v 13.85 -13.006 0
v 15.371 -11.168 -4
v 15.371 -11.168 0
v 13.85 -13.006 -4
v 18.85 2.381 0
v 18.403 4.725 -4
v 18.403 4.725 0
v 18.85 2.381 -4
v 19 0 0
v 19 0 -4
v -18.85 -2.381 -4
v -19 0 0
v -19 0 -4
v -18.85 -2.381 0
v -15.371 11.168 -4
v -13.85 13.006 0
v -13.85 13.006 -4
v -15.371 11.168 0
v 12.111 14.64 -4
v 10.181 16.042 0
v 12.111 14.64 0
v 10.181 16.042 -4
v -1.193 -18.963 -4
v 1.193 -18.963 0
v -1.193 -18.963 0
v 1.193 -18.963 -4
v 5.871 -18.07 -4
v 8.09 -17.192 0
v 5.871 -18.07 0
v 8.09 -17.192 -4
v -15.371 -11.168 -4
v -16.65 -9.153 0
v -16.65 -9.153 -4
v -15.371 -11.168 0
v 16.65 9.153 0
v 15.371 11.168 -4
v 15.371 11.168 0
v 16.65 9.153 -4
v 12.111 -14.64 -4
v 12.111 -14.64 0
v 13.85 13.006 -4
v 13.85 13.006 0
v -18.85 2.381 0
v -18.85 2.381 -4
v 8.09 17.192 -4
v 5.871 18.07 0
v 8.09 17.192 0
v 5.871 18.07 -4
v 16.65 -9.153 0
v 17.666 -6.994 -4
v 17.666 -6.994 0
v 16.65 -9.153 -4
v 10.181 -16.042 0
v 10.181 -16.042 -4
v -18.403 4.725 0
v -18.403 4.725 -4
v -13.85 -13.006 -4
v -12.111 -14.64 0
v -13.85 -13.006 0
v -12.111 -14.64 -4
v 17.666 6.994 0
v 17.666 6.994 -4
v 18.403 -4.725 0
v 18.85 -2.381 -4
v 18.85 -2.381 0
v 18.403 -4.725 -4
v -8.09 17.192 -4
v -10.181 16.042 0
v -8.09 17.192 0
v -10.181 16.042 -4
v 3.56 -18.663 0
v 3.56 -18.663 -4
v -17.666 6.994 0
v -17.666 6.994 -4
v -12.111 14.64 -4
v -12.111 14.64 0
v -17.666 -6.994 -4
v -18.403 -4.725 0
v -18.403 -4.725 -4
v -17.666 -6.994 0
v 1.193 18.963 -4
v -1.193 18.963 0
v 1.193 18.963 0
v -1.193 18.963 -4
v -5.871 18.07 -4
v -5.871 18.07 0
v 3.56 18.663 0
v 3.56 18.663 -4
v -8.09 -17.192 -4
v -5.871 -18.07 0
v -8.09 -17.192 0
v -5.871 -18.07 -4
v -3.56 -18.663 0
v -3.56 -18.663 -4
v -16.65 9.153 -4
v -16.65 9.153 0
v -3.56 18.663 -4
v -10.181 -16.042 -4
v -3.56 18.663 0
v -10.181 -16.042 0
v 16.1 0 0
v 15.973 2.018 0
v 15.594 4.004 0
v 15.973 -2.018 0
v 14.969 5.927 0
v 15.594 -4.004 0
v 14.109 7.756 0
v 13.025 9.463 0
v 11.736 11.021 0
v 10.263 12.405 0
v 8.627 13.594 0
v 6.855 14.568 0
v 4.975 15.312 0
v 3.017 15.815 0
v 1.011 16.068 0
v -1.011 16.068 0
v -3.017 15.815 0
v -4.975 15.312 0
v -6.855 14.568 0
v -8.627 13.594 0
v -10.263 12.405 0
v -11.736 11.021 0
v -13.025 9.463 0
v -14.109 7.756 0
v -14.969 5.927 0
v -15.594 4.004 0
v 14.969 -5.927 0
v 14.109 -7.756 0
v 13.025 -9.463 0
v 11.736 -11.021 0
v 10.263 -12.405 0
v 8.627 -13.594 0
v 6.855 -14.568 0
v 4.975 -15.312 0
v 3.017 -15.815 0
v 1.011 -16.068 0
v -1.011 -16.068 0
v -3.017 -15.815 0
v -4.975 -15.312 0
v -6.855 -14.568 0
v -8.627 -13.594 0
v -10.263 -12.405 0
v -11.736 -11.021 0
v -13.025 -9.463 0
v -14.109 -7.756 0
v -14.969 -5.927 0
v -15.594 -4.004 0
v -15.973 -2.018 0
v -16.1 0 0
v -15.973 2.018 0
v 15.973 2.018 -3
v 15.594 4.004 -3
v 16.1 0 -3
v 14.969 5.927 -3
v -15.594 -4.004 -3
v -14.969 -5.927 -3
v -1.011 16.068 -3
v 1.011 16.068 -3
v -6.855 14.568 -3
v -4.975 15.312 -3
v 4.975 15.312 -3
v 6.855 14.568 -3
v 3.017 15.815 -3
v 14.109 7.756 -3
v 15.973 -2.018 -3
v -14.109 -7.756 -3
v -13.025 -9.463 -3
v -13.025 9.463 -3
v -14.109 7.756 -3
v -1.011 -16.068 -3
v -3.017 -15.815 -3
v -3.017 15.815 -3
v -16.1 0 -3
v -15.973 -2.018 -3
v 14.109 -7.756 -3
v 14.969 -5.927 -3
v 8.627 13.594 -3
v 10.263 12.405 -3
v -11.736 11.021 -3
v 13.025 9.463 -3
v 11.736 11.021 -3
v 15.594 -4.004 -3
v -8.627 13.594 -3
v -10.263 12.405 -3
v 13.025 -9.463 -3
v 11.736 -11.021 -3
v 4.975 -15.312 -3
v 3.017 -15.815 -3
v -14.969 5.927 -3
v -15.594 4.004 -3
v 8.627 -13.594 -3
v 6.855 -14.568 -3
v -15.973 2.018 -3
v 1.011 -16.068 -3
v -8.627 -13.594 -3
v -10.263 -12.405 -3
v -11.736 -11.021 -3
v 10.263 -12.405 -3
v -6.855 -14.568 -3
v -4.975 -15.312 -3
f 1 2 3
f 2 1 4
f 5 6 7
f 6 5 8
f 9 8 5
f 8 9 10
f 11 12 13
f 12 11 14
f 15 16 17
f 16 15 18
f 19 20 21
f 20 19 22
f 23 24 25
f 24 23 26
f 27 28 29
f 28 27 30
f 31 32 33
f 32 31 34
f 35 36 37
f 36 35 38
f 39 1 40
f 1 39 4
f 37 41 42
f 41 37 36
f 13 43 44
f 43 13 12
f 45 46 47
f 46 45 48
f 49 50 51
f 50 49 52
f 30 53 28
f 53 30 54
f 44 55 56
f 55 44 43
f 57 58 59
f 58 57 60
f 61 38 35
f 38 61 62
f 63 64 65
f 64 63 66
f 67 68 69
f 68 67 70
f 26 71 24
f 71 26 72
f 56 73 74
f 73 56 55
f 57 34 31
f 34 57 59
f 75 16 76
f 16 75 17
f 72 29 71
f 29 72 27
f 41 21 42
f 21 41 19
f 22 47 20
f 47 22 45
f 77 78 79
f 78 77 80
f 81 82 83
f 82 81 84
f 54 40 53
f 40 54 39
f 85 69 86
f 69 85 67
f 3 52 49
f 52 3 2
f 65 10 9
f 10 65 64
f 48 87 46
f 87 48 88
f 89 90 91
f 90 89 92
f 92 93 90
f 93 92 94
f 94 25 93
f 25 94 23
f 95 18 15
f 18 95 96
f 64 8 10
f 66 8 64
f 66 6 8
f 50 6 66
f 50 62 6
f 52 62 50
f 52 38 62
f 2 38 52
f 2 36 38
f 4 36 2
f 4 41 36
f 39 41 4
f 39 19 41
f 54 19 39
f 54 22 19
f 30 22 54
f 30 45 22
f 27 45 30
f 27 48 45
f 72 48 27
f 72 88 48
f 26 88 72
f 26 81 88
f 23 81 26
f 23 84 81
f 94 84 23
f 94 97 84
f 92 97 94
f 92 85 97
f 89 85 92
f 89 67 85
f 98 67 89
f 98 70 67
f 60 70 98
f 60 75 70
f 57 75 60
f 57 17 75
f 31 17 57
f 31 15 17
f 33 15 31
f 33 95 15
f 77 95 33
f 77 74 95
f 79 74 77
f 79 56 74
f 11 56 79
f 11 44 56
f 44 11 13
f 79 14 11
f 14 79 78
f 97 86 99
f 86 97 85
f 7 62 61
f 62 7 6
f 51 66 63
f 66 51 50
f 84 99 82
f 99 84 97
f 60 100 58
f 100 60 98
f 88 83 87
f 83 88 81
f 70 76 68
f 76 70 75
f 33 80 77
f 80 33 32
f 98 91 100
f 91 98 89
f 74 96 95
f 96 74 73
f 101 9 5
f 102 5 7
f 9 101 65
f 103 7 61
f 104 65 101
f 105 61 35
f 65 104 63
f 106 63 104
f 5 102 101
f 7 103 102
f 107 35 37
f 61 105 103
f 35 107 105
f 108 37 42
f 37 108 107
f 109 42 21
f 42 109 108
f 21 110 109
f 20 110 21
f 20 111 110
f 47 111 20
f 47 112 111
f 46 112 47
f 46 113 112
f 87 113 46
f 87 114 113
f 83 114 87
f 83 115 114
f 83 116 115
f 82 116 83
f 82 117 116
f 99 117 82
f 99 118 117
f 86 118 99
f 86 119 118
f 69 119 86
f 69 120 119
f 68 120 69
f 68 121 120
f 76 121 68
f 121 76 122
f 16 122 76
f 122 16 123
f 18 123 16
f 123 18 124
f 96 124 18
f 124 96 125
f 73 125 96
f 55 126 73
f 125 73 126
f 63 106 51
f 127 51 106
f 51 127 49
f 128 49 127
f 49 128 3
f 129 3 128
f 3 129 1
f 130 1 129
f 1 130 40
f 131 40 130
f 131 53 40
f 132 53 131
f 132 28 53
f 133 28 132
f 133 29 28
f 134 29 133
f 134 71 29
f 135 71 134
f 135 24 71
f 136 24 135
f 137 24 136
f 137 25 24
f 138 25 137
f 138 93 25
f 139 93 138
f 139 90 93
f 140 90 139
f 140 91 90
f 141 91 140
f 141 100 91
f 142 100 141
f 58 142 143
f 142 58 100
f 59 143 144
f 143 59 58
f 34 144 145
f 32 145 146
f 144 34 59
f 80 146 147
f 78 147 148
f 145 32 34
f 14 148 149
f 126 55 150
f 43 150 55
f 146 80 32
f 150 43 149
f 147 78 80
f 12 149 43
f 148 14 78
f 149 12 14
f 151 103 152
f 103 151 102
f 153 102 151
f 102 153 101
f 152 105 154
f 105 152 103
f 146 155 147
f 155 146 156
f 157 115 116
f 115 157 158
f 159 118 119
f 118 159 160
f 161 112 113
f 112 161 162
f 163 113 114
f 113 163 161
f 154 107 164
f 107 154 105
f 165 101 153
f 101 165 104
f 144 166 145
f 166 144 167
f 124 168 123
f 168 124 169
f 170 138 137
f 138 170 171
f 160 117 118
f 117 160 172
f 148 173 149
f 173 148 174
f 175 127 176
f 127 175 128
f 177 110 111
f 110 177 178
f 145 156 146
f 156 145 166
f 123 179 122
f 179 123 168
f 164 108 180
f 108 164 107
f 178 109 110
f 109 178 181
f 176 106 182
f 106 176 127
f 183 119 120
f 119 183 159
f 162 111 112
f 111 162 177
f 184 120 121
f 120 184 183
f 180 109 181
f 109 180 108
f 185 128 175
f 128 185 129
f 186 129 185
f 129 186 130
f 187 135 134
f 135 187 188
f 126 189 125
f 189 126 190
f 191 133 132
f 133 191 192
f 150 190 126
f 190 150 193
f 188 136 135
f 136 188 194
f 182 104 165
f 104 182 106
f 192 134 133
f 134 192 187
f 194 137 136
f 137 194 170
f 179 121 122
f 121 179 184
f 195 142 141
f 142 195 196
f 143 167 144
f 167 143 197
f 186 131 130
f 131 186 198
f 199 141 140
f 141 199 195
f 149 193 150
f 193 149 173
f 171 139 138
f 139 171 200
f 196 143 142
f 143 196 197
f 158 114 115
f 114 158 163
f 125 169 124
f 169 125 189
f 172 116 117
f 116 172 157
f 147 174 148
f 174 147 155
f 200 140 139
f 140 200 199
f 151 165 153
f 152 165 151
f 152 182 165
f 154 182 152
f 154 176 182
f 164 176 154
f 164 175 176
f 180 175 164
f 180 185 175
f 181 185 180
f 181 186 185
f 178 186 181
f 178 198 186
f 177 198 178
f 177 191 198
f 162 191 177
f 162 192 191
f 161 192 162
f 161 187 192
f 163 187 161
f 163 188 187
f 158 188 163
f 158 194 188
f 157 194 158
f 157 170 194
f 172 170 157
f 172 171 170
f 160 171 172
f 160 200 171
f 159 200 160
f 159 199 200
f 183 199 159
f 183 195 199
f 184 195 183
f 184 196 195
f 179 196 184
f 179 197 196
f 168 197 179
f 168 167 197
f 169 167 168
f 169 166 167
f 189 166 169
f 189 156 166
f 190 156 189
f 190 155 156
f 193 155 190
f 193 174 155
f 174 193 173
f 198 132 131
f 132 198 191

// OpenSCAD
$fn = 50;


difference() {
	union() {
		translate(v = [0, 0, -4.0000000000]) {
			cylinder(h = 4, r = 19.0000000000);
		}
	}
	union() {
		#translate(v = [0, 0, -3.0000000000]) {
			cylinder(h = 3, r = 16.1000000000);
		}
	}
}
